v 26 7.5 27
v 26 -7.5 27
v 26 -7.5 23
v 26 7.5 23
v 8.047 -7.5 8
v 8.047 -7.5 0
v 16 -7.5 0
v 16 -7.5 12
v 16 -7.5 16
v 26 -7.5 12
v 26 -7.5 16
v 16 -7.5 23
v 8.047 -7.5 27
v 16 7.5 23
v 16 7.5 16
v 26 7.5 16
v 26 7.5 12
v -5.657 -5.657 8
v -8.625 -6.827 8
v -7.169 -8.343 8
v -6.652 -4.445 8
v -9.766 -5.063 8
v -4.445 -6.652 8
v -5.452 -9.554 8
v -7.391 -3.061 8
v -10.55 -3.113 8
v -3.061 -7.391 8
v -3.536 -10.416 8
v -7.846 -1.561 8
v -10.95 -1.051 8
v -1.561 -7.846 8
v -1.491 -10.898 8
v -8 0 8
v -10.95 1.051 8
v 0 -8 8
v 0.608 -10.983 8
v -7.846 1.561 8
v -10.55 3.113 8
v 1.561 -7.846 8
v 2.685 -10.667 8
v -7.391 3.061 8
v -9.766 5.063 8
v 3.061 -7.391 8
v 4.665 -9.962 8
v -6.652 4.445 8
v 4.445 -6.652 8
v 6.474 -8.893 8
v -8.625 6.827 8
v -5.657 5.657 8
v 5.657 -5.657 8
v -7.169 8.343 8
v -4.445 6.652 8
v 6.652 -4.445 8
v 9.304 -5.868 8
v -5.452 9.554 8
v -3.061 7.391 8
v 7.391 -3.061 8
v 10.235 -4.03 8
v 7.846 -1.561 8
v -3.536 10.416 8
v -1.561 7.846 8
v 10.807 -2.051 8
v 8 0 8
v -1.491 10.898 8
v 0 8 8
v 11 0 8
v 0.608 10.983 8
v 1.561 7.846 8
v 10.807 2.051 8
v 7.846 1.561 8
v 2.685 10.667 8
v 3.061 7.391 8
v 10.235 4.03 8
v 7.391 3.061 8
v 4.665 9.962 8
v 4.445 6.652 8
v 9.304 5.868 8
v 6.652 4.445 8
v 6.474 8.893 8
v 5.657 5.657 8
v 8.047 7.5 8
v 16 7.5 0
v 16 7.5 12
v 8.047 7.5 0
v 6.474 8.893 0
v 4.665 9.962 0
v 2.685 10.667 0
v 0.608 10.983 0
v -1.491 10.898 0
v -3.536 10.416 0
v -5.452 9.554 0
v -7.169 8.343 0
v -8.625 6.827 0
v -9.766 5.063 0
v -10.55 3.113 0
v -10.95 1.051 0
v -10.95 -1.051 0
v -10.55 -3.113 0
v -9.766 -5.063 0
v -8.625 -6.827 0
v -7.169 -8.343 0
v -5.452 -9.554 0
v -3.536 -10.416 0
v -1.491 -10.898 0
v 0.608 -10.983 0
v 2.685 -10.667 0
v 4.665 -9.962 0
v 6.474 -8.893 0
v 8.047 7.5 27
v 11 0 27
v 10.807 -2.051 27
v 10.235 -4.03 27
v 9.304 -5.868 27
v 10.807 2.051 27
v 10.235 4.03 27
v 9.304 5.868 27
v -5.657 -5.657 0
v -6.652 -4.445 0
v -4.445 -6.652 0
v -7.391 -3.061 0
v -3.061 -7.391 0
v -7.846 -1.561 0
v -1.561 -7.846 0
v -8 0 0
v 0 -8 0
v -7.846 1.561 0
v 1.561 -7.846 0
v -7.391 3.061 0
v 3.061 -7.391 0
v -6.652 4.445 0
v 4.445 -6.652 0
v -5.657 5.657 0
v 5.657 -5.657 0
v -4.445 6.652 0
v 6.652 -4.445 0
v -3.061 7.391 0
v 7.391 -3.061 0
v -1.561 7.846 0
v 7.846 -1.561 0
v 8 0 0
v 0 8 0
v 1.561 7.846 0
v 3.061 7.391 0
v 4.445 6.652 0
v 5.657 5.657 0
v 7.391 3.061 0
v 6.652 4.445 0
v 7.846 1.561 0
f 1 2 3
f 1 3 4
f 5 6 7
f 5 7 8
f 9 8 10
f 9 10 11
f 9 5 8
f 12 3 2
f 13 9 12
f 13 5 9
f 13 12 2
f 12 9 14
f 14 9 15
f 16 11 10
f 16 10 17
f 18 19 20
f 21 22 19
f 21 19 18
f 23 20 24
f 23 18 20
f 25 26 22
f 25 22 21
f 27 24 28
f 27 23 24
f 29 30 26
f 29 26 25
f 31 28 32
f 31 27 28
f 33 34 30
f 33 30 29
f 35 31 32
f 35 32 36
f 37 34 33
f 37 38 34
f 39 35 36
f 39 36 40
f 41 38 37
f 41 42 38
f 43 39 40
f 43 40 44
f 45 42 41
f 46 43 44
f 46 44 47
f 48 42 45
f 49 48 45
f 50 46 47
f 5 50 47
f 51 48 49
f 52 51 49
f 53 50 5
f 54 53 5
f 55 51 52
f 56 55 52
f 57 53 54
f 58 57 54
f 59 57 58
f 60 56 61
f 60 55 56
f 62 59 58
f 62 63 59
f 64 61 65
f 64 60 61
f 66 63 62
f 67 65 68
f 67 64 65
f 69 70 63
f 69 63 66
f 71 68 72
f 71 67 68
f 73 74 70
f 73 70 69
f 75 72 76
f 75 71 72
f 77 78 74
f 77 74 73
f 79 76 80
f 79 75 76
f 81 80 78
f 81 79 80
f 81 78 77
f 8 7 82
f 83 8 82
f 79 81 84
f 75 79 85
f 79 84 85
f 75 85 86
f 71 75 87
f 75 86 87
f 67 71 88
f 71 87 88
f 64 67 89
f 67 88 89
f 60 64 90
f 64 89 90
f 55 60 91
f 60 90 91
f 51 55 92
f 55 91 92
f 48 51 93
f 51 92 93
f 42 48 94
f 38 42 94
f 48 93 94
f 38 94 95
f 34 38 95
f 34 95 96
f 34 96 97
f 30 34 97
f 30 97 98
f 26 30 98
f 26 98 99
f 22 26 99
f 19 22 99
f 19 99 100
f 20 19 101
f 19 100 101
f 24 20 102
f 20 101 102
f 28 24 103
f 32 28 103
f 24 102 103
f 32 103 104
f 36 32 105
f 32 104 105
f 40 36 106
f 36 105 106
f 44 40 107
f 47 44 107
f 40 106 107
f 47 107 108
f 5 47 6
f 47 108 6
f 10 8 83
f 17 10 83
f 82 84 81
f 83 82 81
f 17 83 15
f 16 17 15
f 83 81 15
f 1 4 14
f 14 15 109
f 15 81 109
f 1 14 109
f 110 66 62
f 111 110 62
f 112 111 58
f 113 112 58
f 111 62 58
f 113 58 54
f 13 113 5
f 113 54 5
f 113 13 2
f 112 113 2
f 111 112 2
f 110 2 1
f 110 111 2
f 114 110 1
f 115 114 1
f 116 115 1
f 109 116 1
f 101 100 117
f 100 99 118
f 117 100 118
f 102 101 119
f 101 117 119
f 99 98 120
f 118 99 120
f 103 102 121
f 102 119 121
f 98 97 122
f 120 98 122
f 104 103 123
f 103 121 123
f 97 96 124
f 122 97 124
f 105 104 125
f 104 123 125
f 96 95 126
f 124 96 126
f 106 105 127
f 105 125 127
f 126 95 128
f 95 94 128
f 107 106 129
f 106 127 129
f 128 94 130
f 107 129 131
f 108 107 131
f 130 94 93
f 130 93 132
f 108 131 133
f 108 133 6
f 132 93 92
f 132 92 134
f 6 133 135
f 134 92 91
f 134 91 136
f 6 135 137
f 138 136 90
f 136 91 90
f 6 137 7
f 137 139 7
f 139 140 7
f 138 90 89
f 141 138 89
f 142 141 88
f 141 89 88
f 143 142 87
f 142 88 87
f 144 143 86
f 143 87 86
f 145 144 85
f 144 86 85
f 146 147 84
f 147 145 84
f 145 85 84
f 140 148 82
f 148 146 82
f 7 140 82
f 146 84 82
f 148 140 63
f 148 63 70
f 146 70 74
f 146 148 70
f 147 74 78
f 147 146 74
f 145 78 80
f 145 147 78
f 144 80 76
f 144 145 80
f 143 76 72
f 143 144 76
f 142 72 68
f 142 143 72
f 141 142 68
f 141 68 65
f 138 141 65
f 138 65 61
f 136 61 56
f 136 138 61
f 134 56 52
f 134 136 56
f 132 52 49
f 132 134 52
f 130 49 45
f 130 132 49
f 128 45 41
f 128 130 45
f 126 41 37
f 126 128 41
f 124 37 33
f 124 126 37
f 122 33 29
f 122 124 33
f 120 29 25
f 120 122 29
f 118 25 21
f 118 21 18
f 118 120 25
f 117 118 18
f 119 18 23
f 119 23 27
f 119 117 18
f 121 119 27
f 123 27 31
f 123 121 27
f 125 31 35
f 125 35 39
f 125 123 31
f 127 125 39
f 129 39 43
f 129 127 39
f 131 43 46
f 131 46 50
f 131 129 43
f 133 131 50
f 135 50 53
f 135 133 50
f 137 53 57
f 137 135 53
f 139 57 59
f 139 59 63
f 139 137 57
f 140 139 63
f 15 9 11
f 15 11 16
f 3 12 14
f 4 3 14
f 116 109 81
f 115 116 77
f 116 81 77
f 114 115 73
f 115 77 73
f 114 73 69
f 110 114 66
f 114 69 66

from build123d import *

# Parameters (mm, degrees)
F0_R     = 8
F1_DEPTH = 8
F2_DEPTH = 27
F3_W     = 15
F3_H     = 4
F4_DEPTH = 10
F5_W     = 15
F5_H     = 4
F6_DEPTH = 10


with BuildPart() as f1:
    # F0 (on Top) → F1 (new body)
    with BuildSketch(Plane.XY):
        Circle(F0_R)
        with BuildLine():
            ThreePointArc((8.046738, -7.5), (10.23509, -4.030253), (11, 0))
            ThreePointArc((11, 0), (10.23509, 4.030253), (8.046738, 7.5))
            ThreePointArc((8.046738, 7.5), (-11, 0), (8.046738, -7.5))
        make_face()
        Circle(F0_R, mode=Mode.SUBTRACT)
        with BuildLine():
            ThreePointArc((8.046738, 7.5), (10.23509, 4.030253), (11, 0))
            Line((11, 0), (16, 0))
            Line((16, 0), (16, 7.5))
            Line((16, 7.5), (8.046738, 7.5))
        make_face()
        with BuildLine():
            Line((16, 0), (11, 0))
            ThreePointArc((11, 0), (10.23509, -4.030253), (8.046738, -7.5))
            Line((8.046738, -7.5), (16, -7.5))
            Line((16, -7.5), (16, 0))
        make_face()
    extrude(amount=F1_DEPTH)

    # F0 (on Top) → F2 (join)
    with BuildSketch(Plane.XY):
        with BuildLine():
            ThreePointArc((8.046738, 7.5), (10.23509, 4.030253), (11, 0))
            Line((11, 0), (16, 0))
            Line((16, 0), (16, 7.5))
            Line((16, 7.5), (8.046738, 7.5))
        make_face()
        with BuildLine():
            Line((16, 0), (11, 0))
            ThreePointArc((11, 0), (10.23509, -4.030253), (8.046738, -7.5))
            Line((8.046738, -7.5), (16, -7.5))
            Line((16, -7.5), (16, 0))
        make_face()
    extrude(amount=F2_DEPTH)

    # F3 (on face) → F4 (join)
    with BuildSketch(Plane.YZ.offset(16)):
        with Locations((0, 25)):
            Rectangle(F3_W, F3_H)
    extrude(amount=F4_DEPTH)

    # F5 (on face) → F6 (join)
    with BuildSketch(Plane.YZ.offset(16)):
        with Locations((0, 14)):
            Rectangle(F5_W, F5_H)
    extrude(amount=F6_DEPTH)


solid = f1.part
